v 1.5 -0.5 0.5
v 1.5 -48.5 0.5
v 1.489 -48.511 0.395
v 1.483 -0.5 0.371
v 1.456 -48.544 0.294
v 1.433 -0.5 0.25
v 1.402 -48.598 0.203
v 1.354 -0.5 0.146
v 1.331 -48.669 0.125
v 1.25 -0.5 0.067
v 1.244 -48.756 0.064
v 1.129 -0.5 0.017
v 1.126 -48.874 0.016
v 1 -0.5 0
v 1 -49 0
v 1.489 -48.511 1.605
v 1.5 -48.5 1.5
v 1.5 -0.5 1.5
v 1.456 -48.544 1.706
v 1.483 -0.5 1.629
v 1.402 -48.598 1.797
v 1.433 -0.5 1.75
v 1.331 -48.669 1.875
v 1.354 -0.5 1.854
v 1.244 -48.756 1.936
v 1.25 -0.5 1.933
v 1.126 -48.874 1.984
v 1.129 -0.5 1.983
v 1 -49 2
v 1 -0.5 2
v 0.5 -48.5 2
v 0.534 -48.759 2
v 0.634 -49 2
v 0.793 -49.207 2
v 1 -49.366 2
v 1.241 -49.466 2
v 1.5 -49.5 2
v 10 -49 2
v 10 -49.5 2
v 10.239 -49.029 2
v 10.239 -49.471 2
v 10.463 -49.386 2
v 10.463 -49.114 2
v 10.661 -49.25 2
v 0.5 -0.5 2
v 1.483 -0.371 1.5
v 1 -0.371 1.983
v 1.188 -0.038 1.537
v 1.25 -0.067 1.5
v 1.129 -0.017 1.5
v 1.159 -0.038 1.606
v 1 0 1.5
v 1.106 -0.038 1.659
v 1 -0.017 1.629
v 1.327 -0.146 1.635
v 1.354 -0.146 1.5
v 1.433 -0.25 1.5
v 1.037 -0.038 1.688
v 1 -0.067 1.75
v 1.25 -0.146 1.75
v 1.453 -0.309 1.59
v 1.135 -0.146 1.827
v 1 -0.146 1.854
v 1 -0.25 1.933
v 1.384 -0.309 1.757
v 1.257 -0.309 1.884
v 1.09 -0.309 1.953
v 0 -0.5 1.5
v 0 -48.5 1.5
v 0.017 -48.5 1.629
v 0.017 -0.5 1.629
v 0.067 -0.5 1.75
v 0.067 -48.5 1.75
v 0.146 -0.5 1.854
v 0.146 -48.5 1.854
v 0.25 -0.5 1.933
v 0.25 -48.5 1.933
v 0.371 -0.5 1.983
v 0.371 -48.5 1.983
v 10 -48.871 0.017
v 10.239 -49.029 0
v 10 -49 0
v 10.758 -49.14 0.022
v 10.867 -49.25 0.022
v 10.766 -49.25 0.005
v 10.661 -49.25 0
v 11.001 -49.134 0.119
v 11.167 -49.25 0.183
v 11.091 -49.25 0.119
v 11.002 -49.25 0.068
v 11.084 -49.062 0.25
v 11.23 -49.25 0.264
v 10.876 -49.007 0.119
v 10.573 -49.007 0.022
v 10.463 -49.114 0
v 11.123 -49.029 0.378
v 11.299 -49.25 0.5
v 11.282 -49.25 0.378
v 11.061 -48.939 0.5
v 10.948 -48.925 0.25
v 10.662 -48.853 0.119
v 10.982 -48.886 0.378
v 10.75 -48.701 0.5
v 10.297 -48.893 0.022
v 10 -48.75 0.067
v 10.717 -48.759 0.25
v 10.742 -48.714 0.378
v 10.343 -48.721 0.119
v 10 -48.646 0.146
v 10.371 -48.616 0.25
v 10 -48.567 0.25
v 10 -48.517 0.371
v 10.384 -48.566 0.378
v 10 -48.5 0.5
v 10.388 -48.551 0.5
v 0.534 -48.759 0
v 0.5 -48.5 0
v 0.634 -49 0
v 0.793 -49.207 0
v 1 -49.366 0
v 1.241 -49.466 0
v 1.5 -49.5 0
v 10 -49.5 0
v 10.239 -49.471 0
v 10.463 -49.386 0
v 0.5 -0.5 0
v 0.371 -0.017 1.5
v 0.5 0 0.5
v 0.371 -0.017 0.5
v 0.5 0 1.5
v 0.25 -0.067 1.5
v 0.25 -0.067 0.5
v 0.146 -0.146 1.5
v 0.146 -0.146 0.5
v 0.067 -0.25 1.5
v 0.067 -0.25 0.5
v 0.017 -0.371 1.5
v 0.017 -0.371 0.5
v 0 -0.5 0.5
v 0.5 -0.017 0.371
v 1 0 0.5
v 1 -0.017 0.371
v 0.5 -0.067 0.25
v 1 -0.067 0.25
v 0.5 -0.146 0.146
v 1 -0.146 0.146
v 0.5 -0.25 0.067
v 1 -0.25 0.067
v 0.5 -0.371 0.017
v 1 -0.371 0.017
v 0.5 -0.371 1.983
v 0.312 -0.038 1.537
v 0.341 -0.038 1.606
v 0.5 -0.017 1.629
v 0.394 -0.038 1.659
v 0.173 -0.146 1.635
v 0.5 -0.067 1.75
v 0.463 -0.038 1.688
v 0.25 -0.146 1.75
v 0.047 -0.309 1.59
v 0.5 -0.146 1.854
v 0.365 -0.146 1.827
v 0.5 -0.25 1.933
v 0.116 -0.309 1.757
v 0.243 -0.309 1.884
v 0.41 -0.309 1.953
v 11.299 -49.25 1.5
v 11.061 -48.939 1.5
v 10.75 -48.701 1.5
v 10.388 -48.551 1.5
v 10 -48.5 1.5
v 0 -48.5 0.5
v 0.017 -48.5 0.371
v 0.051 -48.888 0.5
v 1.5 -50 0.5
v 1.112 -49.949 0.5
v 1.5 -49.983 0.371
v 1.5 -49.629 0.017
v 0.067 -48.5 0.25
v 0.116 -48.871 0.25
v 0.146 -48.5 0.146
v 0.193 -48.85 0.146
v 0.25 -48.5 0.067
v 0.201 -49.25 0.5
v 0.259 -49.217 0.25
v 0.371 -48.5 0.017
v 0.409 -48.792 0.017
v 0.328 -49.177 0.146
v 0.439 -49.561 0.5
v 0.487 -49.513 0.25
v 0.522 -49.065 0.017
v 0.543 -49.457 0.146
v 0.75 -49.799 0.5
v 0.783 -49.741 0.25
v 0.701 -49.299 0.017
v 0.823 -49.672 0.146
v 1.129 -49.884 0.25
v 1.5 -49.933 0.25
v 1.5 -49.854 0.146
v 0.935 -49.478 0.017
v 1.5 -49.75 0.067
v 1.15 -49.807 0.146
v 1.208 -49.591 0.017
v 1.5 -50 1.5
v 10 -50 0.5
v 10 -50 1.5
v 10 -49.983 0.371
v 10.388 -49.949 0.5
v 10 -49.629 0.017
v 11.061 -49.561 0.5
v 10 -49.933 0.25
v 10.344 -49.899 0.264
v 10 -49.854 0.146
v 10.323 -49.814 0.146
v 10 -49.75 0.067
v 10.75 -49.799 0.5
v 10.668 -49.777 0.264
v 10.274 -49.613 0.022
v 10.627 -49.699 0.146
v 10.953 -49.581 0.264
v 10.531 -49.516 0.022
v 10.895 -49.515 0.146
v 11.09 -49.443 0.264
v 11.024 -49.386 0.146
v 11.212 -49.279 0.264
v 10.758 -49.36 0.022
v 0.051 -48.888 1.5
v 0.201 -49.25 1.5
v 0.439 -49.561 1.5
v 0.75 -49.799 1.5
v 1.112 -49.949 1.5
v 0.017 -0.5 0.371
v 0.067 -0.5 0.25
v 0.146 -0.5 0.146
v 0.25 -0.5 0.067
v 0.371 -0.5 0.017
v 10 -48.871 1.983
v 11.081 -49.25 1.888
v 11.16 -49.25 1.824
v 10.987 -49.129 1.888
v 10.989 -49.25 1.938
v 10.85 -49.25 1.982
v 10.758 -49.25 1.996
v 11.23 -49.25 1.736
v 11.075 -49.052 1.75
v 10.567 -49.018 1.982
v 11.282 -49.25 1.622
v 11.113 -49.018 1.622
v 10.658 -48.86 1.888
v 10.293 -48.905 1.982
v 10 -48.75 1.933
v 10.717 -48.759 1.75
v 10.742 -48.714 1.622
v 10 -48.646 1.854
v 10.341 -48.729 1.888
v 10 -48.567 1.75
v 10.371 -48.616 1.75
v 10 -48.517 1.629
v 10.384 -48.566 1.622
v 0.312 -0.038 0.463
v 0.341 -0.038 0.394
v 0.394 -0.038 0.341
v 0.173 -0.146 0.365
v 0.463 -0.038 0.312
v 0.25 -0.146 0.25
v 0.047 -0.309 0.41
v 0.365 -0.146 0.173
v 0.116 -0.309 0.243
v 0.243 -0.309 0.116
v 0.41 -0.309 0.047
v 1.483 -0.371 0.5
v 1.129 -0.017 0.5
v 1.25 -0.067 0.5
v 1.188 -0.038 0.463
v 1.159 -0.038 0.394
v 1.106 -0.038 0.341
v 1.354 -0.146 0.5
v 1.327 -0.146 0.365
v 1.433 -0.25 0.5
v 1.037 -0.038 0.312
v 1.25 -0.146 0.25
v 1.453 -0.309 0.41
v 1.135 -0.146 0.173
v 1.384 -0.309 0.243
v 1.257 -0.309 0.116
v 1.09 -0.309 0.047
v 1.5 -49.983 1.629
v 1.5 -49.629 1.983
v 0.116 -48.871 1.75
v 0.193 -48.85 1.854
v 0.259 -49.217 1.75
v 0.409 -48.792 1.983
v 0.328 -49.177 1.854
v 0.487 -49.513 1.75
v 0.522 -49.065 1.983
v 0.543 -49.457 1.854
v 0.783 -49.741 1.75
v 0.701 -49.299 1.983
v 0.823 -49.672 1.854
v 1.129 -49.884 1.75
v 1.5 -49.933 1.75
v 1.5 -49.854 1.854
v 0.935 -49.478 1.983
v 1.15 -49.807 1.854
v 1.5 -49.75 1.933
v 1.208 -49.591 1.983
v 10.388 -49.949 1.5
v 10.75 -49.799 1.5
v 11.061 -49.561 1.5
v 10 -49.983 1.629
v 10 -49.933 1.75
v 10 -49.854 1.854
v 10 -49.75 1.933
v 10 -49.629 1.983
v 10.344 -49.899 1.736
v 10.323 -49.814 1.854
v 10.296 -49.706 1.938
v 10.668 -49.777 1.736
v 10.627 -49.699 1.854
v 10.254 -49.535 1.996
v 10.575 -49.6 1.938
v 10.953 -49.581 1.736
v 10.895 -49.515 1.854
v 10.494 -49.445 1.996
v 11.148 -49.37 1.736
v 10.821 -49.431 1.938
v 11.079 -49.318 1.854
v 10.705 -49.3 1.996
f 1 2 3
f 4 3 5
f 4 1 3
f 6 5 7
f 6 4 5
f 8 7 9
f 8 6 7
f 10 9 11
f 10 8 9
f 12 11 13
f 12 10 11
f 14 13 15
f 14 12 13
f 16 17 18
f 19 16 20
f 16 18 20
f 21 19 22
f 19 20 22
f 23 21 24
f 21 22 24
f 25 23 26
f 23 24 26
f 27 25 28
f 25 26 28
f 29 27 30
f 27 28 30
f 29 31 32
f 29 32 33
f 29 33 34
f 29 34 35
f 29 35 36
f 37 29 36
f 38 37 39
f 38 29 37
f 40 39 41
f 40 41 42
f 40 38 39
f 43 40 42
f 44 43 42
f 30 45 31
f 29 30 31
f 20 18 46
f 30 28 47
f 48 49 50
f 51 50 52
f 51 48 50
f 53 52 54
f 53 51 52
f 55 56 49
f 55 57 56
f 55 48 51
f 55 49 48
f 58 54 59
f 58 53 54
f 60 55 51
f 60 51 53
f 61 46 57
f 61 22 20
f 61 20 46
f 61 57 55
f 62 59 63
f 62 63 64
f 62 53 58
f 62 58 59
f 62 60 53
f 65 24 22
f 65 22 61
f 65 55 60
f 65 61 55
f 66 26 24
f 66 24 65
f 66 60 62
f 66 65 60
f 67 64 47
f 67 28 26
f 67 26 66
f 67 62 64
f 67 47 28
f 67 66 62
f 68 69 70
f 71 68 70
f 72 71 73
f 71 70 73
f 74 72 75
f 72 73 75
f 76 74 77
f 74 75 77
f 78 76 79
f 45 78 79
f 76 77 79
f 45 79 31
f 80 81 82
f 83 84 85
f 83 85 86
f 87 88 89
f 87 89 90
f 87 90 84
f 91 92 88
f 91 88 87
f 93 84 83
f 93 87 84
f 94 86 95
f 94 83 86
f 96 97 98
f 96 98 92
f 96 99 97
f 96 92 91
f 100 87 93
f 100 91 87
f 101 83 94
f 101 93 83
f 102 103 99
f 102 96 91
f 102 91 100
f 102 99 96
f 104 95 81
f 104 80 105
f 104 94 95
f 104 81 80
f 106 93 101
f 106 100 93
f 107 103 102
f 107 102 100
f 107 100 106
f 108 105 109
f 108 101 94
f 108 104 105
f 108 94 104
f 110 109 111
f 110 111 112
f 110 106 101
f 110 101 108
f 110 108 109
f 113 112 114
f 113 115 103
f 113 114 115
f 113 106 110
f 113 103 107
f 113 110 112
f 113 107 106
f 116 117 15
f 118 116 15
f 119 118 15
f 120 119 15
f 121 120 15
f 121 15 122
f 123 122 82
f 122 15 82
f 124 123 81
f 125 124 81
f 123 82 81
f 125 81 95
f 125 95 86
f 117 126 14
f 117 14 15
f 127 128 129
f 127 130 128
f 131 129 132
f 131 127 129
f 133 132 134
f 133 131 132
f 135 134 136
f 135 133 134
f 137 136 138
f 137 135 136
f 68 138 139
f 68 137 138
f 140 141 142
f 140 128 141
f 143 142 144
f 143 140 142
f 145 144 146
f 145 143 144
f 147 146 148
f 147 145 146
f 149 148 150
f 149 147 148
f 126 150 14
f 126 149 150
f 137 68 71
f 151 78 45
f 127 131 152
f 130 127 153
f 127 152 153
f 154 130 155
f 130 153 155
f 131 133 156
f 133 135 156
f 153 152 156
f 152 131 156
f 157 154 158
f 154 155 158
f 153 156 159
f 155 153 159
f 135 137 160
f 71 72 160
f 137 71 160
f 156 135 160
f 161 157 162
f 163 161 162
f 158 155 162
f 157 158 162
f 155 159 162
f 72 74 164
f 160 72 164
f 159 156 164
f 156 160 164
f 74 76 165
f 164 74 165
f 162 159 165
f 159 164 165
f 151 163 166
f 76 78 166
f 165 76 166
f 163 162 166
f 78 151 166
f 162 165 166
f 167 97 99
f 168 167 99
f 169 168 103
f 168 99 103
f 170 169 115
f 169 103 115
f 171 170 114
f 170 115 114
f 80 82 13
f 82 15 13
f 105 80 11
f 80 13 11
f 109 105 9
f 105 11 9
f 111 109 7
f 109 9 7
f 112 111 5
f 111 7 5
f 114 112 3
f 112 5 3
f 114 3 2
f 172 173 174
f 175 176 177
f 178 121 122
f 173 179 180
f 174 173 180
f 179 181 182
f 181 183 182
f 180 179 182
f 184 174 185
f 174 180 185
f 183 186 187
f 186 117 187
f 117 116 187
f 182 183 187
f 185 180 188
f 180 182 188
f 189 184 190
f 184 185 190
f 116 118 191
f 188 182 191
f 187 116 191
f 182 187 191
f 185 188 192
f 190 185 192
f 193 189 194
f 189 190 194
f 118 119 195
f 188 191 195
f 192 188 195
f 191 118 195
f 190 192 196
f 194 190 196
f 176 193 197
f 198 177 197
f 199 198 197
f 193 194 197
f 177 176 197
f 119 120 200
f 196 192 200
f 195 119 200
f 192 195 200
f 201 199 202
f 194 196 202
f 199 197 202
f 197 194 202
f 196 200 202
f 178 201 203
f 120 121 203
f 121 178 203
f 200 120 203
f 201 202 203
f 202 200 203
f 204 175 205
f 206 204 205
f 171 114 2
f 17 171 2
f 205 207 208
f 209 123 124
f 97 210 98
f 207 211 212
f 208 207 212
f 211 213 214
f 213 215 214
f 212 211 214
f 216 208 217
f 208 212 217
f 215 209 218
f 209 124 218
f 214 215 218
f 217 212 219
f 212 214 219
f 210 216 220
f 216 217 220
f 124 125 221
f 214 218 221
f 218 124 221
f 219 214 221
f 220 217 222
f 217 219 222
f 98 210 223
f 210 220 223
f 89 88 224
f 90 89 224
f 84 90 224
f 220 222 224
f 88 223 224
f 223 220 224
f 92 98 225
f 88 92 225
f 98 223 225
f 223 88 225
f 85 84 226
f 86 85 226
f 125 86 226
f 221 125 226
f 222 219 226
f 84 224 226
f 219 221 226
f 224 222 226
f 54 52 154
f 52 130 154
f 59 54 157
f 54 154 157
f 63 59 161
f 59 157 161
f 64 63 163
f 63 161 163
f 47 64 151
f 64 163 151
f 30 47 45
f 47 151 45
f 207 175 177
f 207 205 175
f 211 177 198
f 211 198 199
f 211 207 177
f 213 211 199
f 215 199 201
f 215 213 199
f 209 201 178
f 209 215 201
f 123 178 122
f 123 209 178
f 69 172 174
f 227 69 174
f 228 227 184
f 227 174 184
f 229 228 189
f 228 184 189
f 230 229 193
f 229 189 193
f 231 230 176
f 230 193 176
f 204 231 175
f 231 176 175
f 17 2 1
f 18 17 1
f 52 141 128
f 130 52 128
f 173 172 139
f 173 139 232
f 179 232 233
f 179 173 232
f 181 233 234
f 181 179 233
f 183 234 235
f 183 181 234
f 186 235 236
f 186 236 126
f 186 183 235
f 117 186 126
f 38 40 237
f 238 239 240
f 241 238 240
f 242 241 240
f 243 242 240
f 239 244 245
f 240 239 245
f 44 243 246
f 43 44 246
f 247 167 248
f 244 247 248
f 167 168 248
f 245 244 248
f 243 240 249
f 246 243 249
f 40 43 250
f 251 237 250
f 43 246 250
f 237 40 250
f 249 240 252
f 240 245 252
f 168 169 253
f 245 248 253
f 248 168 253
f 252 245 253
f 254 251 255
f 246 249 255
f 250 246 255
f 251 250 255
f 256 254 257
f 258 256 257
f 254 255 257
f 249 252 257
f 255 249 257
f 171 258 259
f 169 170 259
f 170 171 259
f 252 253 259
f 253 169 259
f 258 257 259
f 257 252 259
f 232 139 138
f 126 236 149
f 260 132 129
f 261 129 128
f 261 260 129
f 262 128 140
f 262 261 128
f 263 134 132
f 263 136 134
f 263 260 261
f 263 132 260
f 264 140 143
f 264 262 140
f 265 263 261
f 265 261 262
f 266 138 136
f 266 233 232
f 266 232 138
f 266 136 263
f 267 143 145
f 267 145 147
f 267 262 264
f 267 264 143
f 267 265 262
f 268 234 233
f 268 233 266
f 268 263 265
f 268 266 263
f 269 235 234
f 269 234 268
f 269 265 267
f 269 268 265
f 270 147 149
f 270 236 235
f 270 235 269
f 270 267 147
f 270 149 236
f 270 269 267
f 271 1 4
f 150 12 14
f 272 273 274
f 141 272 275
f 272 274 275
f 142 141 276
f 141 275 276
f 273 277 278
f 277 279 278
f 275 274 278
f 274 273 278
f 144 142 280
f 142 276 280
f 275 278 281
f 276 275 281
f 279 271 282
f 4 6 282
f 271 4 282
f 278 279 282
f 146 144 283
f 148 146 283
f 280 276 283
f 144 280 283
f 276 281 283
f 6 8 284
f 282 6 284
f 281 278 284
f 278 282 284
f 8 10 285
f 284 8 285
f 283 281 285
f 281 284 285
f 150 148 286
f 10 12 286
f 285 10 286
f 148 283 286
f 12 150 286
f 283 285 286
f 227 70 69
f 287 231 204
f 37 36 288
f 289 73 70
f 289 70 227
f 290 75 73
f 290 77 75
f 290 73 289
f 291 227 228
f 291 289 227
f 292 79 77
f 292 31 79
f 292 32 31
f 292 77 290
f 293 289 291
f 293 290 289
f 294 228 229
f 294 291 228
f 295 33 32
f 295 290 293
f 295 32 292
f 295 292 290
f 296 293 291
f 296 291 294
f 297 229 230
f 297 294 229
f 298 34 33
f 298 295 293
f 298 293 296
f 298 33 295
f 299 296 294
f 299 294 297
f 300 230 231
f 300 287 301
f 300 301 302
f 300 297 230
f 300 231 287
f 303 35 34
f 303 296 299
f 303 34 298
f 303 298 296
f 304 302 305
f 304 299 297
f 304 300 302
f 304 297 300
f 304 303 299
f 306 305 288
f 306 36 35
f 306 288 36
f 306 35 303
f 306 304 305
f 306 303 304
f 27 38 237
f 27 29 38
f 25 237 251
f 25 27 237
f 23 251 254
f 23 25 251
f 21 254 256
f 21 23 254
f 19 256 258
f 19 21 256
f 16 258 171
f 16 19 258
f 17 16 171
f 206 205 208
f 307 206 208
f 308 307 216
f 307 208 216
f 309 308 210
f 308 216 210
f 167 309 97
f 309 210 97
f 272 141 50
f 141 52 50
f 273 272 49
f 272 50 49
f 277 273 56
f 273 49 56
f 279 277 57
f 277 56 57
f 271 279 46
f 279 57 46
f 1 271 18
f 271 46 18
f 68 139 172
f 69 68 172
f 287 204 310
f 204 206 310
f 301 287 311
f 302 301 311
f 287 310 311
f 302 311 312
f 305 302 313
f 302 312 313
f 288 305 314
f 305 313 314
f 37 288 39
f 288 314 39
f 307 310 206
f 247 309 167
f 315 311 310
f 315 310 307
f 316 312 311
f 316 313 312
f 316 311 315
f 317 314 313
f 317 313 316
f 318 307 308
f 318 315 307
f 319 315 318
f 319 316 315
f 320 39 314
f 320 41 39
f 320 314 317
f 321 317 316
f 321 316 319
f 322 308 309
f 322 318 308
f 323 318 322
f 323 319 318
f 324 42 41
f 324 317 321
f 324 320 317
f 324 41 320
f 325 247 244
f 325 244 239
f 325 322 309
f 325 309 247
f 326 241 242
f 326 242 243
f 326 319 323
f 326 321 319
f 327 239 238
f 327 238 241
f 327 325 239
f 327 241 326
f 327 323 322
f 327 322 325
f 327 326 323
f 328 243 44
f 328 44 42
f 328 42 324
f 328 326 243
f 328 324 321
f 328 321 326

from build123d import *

# Parameters (mm, degrees)
F1_DEPTH    = 2
F2_T1_DEPTH = 9.5
F3_R        = 0.5


# Not quite as in the source:
# - a fillet or chamfer that OpenCascade refuses, or shapes differently, is made with other operations: its cross-section is extruded or revolved along the edge and cut away or added


with BuildPart() as f1:
    # F0 (on Top) → F1 (new body)
    with BuildSketch(Plane.XY):
        Polygon((1.5, 0), (0, 0), (0, -50), (11.5, -50), (11.5, -48.5), (1.5, -48.5), align=None)
    extrude(amount=F1_DEPTH)

    # F2: fillet of radius 1.5 on 3 edges, made by hand

    # F2_s2 → F2_t1 (cut)
    with BuildSketch(Plane.XY.offset(-3.75)):
        with BuildLine():
            ThreePointArc((10, -50), (11.0606601718, -49.5606601718), (11.5, -48.5))
            Line((11.5, -48.5), (11.5, -50))
            Line((11.5, -50), (10, -50))
        make_face()
        with BuildLine():
            ThreePointArc((0, -48.5), (0.4393398282, -49.5606601718), (1.5, -50))
            Line((1.5, -50), (0, -50))
            Line((0, -50), (0, -48.5))
        make_face()
        with BuildLine():
            ThreePointArc((11.5, -50), (11.0606601718, -48.9393398282), (10, -48.5))
            Line((10, -48.5), (11.5, -48.5))
            Line((11.5, -48.5), (11.5, -50))
        make_face()
    extrude(amount=F2_T1_DEPTH, mode=Mode.SUBTRACT)

    # F3
    f3_edges = [f1.edges().sort_by_distance(p)[0] for p in [
        (0, -24.25, 2),
        (0, -24.25, 0),
        (1.5, -24.25, 0),
        (1.5, -24.25, 2),
        (1.5, 0, 1),
        (0, 0, 1),
        (0.75, 0, 0),
        (0.75, 0, 2),
        (5.75, -48.5, 0),
        (10.75, -48.700962, 0),
        (10.75, -49.799038, 0),
        (5.75, -50, 0),
        (0.43934, -49.56066, 0),
        (5.75, -48.5, 2),
        (10.75, -48.700962, 2),
        (10.75, -49.799038, 2),
        (5.75, -50, 2),
        (0.43934, -49.56066, 2),
    ]]
    fillet(f3_edges, radius=F3_R)


solid = f1.part
